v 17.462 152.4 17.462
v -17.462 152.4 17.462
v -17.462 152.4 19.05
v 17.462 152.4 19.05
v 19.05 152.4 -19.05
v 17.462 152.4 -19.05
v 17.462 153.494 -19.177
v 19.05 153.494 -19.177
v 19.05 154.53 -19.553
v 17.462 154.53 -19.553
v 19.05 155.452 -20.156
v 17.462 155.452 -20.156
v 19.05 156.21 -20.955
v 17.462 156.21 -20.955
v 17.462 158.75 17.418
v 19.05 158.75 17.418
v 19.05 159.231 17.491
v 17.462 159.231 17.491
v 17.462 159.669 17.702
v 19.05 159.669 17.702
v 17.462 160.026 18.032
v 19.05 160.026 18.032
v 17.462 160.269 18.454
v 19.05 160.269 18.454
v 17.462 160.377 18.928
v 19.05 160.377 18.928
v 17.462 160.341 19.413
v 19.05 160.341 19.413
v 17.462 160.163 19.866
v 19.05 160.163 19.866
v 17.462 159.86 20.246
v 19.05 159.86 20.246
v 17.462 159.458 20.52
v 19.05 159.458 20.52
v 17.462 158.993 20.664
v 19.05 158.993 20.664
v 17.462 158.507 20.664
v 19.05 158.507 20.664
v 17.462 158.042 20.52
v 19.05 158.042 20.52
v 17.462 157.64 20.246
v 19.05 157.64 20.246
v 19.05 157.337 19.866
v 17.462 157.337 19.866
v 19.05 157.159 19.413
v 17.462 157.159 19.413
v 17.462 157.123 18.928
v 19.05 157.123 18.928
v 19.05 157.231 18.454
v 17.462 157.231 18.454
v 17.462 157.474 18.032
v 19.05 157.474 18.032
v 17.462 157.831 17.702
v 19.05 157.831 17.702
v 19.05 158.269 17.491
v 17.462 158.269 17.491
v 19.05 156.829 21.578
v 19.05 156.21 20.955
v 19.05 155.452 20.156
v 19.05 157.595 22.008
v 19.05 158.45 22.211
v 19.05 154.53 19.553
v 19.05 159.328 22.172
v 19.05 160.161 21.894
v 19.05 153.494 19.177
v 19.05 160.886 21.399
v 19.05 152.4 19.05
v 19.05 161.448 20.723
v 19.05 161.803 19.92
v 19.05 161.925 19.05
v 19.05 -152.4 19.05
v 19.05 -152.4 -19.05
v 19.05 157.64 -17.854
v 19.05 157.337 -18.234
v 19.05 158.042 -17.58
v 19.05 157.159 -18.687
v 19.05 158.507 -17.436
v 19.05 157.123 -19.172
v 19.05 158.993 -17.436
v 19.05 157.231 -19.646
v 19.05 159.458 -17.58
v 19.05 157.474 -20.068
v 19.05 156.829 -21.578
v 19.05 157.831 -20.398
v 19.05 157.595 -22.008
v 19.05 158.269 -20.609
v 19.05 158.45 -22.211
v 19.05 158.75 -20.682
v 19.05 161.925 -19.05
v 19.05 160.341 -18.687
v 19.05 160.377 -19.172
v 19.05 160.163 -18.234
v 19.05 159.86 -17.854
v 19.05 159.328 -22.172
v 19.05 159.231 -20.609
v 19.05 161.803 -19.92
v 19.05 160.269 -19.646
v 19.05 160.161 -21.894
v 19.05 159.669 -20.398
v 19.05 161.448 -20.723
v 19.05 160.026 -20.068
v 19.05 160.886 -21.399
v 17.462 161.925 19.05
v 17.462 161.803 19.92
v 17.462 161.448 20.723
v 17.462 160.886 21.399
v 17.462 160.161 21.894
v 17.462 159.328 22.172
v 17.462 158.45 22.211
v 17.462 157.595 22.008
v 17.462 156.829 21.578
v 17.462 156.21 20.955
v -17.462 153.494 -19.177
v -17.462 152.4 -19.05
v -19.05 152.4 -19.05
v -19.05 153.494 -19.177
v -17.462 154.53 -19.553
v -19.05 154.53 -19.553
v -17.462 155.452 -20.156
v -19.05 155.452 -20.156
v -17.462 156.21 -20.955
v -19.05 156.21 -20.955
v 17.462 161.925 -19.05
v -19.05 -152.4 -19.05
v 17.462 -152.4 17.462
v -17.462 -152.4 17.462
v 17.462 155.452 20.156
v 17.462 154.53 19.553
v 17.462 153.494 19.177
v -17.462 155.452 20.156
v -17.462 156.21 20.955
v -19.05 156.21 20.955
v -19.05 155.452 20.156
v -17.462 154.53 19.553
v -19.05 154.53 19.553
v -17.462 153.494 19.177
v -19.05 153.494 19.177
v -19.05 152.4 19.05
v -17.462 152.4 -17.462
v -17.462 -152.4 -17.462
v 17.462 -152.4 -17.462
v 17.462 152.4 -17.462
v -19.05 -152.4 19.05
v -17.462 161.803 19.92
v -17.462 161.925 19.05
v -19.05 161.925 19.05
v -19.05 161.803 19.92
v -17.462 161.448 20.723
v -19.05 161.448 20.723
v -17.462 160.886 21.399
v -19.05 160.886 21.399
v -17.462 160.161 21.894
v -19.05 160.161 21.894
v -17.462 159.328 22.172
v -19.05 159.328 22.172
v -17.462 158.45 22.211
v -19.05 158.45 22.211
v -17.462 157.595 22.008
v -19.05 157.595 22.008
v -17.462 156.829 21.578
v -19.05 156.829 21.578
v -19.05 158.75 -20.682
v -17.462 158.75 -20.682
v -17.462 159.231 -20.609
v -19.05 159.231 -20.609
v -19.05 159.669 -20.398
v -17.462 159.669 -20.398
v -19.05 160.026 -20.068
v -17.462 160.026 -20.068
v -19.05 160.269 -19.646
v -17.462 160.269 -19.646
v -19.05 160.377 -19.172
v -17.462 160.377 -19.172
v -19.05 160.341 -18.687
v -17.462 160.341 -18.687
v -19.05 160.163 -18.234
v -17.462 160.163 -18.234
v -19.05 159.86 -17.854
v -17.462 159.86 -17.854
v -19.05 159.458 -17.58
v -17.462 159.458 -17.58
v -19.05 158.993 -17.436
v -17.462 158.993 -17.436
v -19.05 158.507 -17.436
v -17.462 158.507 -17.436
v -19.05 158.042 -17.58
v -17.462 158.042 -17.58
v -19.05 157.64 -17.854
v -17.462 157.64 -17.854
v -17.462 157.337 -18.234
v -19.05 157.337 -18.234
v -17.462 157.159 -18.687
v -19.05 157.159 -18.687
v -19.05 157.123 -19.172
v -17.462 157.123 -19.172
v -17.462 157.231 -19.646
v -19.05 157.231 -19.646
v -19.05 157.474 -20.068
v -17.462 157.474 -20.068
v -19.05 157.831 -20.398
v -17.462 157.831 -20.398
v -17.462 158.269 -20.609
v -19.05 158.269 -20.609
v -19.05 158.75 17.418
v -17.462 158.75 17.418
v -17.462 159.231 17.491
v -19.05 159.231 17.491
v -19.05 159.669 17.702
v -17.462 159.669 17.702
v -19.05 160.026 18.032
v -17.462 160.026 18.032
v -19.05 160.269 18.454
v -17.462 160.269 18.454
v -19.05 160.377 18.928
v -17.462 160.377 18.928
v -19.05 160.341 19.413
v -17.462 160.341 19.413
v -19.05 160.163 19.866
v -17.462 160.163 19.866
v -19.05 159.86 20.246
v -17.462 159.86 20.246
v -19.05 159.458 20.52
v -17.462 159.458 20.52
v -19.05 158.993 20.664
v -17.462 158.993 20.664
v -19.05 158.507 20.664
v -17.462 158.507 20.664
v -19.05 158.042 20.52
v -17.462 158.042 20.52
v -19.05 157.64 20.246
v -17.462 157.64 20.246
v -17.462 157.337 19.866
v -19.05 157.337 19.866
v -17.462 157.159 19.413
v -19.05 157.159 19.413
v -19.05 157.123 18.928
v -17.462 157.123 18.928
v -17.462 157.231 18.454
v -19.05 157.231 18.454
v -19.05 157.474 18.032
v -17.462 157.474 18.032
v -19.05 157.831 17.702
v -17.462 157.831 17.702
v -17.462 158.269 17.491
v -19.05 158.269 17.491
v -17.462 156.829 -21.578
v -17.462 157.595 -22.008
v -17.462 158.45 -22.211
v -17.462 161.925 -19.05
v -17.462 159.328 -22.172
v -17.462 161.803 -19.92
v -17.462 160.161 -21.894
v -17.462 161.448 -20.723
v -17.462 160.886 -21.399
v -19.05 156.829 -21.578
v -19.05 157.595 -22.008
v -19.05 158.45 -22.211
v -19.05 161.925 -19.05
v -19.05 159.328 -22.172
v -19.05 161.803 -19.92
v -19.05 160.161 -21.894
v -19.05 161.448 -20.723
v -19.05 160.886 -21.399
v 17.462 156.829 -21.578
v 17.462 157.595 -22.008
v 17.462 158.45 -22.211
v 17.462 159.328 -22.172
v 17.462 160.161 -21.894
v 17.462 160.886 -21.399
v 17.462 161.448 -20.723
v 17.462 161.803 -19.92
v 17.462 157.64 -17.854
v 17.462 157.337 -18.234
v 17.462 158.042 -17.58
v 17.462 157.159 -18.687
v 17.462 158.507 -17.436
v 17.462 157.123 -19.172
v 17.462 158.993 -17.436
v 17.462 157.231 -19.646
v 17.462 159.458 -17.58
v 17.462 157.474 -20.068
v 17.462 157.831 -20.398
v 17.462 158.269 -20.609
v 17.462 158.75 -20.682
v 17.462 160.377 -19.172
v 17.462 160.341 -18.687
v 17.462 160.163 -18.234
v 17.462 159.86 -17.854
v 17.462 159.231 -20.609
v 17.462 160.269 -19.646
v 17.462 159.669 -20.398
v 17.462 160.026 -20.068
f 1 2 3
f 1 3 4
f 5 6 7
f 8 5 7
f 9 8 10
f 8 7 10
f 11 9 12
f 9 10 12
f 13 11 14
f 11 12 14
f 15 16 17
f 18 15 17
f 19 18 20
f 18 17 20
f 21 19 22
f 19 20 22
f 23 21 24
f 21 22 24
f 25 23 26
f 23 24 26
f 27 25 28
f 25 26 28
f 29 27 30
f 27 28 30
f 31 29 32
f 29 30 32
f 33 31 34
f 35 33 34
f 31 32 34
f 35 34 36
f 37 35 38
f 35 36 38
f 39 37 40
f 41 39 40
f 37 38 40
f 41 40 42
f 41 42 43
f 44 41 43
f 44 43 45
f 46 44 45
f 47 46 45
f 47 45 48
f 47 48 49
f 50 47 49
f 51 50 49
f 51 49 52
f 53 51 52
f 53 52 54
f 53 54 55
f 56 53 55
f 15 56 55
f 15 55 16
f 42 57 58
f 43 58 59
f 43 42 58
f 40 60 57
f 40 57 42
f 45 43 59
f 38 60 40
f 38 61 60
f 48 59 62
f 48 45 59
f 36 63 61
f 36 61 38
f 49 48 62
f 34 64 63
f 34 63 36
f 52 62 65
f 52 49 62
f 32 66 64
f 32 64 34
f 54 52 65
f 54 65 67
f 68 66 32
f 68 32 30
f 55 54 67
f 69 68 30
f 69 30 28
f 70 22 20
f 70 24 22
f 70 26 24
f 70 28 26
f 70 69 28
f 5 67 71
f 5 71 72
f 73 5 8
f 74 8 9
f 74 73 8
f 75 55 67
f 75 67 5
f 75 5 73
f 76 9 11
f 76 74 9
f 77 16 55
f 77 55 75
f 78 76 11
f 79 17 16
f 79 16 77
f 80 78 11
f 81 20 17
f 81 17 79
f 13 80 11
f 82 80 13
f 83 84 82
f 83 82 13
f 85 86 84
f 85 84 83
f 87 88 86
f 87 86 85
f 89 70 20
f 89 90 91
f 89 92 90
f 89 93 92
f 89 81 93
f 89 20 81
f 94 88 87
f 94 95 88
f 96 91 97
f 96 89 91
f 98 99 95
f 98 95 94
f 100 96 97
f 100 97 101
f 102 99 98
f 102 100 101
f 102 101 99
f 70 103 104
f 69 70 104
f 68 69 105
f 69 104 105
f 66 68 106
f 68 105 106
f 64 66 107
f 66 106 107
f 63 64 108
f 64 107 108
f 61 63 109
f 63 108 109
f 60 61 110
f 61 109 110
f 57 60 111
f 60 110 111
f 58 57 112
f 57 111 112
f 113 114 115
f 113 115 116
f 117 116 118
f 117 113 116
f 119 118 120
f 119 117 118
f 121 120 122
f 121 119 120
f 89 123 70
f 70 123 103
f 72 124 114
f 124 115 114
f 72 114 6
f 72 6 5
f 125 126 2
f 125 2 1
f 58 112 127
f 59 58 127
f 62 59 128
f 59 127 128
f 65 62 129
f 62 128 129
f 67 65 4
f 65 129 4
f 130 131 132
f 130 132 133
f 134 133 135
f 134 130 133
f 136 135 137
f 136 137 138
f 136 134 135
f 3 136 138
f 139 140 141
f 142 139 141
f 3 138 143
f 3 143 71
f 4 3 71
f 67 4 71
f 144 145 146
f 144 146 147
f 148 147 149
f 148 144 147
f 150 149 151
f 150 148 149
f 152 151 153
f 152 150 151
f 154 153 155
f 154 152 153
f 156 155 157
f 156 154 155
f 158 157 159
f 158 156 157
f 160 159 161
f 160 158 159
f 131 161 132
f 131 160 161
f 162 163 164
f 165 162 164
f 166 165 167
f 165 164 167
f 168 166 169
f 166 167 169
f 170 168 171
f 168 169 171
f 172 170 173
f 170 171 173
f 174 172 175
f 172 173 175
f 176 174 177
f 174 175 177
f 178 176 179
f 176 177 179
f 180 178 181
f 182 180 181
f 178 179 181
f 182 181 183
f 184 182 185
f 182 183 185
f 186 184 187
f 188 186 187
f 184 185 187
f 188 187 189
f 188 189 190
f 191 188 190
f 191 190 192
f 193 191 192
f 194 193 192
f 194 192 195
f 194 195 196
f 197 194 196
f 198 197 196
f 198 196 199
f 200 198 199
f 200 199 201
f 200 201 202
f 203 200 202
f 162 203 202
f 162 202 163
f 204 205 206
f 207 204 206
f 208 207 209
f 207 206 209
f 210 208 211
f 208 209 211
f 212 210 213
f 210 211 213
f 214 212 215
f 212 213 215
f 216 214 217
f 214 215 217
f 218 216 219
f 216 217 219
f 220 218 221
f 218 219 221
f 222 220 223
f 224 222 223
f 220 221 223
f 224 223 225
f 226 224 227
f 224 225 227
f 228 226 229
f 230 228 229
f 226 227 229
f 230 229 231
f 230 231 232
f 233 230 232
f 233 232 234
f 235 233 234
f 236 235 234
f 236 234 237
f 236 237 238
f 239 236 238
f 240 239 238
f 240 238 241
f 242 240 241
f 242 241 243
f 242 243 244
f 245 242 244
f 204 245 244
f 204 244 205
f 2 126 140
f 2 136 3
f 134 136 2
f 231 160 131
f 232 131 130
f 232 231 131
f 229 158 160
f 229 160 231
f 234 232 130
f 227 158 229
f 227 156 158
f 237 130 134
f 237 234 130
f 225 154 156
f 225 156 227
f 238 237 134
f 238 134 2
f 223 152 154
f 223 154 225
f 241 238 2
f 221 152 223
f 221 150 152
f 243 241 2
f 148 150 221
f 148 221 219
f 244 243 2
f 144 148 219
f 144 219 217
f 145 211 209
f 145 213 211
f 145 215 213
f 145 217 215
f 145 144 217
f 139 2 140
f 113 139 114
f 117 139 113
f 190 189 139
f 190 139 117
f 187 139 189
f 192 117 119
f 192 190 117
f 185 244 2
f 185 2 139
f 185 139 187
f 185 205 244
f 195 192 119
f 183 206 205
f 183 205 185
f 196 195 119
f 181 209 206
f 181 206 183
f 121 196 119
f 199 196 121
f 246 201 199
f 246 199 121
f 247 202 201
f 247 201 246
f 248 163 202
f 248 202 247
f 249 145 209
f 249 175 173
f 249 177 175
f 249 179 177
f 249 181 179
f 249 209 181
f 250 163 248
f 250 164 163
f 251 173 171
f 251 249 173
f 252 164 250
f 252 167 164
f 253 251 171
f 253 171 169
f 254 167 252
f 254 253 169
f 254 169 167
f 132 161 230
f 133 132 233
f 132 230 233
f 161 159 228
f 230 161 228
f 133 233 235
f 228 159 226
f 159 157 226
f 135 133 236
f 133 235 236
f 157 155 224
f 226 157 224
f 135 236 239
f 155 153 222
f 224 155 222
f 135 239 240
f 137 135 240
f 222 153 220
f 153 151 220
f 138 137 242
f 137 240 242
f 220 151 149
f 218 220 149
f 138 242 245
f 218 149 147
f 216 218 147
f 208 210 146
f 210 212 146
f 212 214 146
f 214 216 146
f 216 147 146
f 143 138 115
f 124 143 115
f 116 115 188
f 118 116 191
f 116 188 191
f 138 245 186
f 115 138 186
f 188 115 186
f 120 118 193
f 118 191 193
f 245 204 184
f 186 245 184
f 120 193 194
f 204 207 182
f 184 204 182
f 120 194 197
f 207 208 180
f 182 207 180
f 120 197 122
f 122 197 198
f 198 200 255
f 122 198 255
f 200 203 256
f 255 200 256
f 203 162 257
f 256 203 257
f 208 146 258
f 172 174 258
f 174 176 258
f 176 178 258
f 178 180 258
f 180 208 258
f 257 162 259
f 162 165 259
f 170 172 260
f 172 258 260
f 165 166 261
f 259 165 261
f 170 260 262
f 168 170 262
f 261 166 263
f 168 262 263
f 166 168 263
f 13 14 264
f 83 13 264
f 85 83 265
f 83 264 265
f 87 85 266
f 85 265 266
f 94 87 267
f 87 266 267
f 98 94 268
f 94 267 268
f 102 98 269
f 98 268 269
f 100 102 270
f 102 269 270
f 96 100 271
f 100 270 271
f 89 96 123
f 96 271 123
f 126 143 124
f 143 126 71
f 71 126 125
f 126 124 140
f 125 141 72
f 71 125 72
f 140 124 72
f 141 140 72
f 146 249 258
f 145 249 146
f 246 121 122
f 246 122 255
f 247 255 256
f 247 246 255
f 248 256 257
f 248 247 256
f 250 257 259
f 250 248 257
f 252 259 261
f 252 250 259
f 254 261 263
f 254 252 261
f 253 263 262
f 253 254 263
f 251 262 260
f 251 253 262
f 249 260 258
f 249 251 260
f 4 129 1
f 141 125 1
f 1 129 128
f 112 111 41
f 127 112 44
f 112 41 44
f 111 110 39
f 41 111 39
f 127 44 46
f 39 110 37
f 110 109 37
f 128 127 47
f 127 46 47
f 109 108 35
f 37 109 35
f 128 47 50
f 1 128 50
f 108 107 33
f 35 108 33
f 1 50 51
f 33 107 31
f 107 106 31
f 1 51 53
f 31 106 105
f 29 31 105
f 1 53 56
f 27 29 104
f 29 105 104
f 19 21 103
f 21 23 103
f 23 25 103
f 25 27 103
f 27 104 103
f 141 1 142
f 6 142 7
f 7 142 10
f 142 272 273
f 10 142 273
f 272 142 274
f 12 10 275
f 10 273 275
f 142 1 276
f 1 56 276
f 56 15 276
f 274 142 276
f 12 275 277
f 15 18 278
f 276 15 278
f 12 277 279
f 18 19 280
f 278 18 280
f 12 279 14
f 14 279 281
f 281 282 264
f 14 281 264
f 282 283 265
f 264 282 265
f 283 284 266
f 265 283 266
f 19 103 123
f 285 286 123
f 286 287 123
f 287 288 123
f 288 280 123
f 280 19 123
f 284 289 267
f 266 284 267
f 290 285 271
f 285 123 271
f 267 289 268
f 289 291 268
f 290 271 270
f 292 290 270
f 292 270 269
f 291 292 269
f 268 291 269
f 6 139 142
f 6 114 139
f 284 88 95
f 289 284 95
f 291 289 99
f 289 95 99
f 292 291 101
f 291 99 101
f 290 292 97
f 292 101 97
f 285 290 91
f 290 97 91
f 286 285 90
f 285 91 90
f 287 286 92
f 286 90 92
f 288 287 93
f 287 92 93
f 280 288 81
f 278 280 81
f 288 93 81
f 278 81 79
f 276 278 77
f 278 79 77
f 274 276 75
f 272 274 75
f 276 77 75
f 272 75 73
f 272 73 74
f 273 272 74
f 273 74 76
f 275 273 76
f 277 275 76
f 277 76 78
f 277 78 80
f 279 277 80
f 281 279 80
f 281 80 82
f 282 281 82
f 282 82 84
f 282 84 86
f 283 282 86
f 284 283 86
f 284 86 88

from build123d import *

# Parameters (mm, degrees)
SKETCH1_W             = 38.1
SKETCH1_H             = 38.1
SKETCH1_W_2           = 34.925
SKETCH1_H_2           = 34.925
EXTRUDE_THIN1_DEPTH   = 152.4
BOSS_EXTRUDE1_DEPTH   = 1.5875
BOSS_EXTRUDE2_START   = 34.925
BOSS_EXTRUDE2_DEPTH   = 1.5875
F_4_CLEARANCE_HOLE1_D = 3.2639


# Read off the part's stored shape, not the designer's step: Boss-Extrude2
with BuildPart() as part:
    # Sketch1 → Extrude-Thin1 (new, symmetric)
    with BuildSketch(Plane(origin=(0, 0, 0), x_dir=(1, 0, 0), z_dir=(0, 1, 0))):
        Rectangle(SKETCH1_W, SKETCH1_H)
        Rectangle(SKETCH1_W_2, SKETCH1_H_2, mode=Mode.SUBTRACT)
    extrude(amount=EXTRUDE_THIN1_DEPTH, both=True)

    # Sketch3 → Boss-Extrude1 (add)
    with BuildSketch(Plane(origin=(-17.4625, 0, 0), x_dir=(0, 0, -1), z_dir=(1, 0, 0))):
        with BuildLine():
            Line((-19.05, 152.4), (19.05, 152.4))
            ThreePointArc((19.05, 152.4), (19.552790503, 154.529854749), (20.955, 156.21))
            ThreePointArc((20.955, 156.21), (22.062069471, 159.754023157), (19.05, 161.925))
            Line((19.05, 161.925), (-19.05, 161.925))
            ThreePointArc((-19.05, 161.925), (-22.062069471, 159.754023157), (-20.955, 156.21))
            ThreePointArc((-20.955, 156.21), (-19.552790503, 154.529854749), (-19.05, 152.4))
        make_face()
    extrude(amount=-BOSS_EXTRUDE1_DEPTH)

    # Boss-Extrude2 outline → Boss-Extrude2 (add)
    with BuildSketch(Plane(origin=(-17.4625, 0, 0), x_dir=(0, 0, -1), z_dir=(1, 0, 0)).offset(BOSS_EXTRUDE2_START)):
        with BuildLine():
            Line((19.05, 161.925), (-19.05, 161.925))
            ThreePointArc((-19.05, 161.925), (-22.062069471, 159.754023157), (-20.955, 156.21))
            ThreePointArc((-20.955, 156.21), (-19.552790503, 154.529854749), (-19.05, 152.4))
            Line((-19.05, 152.4), (19.05, 152.4))
            ThreePointArc((19.05, 152.4), (19.552790503, 154.529854749), (20.955, 156.21))
            ThreePointArc((20.955, 156.21), (22.062069471, 159.754023157), (19.05, 161.925))
        make_face()
    extrude(amount=BOSS_EXTRUDE2_DEPTH)

    # #4 Clearance Hole1 (through all)
    with Locations(Plane.ZY.offset(19.05)):
        with Locations((-19.05, 158.75), (19.05, 158.75)):
            Hole(F_4_CLEARANCE_HOLE1_D / 2)


solid = part.part
